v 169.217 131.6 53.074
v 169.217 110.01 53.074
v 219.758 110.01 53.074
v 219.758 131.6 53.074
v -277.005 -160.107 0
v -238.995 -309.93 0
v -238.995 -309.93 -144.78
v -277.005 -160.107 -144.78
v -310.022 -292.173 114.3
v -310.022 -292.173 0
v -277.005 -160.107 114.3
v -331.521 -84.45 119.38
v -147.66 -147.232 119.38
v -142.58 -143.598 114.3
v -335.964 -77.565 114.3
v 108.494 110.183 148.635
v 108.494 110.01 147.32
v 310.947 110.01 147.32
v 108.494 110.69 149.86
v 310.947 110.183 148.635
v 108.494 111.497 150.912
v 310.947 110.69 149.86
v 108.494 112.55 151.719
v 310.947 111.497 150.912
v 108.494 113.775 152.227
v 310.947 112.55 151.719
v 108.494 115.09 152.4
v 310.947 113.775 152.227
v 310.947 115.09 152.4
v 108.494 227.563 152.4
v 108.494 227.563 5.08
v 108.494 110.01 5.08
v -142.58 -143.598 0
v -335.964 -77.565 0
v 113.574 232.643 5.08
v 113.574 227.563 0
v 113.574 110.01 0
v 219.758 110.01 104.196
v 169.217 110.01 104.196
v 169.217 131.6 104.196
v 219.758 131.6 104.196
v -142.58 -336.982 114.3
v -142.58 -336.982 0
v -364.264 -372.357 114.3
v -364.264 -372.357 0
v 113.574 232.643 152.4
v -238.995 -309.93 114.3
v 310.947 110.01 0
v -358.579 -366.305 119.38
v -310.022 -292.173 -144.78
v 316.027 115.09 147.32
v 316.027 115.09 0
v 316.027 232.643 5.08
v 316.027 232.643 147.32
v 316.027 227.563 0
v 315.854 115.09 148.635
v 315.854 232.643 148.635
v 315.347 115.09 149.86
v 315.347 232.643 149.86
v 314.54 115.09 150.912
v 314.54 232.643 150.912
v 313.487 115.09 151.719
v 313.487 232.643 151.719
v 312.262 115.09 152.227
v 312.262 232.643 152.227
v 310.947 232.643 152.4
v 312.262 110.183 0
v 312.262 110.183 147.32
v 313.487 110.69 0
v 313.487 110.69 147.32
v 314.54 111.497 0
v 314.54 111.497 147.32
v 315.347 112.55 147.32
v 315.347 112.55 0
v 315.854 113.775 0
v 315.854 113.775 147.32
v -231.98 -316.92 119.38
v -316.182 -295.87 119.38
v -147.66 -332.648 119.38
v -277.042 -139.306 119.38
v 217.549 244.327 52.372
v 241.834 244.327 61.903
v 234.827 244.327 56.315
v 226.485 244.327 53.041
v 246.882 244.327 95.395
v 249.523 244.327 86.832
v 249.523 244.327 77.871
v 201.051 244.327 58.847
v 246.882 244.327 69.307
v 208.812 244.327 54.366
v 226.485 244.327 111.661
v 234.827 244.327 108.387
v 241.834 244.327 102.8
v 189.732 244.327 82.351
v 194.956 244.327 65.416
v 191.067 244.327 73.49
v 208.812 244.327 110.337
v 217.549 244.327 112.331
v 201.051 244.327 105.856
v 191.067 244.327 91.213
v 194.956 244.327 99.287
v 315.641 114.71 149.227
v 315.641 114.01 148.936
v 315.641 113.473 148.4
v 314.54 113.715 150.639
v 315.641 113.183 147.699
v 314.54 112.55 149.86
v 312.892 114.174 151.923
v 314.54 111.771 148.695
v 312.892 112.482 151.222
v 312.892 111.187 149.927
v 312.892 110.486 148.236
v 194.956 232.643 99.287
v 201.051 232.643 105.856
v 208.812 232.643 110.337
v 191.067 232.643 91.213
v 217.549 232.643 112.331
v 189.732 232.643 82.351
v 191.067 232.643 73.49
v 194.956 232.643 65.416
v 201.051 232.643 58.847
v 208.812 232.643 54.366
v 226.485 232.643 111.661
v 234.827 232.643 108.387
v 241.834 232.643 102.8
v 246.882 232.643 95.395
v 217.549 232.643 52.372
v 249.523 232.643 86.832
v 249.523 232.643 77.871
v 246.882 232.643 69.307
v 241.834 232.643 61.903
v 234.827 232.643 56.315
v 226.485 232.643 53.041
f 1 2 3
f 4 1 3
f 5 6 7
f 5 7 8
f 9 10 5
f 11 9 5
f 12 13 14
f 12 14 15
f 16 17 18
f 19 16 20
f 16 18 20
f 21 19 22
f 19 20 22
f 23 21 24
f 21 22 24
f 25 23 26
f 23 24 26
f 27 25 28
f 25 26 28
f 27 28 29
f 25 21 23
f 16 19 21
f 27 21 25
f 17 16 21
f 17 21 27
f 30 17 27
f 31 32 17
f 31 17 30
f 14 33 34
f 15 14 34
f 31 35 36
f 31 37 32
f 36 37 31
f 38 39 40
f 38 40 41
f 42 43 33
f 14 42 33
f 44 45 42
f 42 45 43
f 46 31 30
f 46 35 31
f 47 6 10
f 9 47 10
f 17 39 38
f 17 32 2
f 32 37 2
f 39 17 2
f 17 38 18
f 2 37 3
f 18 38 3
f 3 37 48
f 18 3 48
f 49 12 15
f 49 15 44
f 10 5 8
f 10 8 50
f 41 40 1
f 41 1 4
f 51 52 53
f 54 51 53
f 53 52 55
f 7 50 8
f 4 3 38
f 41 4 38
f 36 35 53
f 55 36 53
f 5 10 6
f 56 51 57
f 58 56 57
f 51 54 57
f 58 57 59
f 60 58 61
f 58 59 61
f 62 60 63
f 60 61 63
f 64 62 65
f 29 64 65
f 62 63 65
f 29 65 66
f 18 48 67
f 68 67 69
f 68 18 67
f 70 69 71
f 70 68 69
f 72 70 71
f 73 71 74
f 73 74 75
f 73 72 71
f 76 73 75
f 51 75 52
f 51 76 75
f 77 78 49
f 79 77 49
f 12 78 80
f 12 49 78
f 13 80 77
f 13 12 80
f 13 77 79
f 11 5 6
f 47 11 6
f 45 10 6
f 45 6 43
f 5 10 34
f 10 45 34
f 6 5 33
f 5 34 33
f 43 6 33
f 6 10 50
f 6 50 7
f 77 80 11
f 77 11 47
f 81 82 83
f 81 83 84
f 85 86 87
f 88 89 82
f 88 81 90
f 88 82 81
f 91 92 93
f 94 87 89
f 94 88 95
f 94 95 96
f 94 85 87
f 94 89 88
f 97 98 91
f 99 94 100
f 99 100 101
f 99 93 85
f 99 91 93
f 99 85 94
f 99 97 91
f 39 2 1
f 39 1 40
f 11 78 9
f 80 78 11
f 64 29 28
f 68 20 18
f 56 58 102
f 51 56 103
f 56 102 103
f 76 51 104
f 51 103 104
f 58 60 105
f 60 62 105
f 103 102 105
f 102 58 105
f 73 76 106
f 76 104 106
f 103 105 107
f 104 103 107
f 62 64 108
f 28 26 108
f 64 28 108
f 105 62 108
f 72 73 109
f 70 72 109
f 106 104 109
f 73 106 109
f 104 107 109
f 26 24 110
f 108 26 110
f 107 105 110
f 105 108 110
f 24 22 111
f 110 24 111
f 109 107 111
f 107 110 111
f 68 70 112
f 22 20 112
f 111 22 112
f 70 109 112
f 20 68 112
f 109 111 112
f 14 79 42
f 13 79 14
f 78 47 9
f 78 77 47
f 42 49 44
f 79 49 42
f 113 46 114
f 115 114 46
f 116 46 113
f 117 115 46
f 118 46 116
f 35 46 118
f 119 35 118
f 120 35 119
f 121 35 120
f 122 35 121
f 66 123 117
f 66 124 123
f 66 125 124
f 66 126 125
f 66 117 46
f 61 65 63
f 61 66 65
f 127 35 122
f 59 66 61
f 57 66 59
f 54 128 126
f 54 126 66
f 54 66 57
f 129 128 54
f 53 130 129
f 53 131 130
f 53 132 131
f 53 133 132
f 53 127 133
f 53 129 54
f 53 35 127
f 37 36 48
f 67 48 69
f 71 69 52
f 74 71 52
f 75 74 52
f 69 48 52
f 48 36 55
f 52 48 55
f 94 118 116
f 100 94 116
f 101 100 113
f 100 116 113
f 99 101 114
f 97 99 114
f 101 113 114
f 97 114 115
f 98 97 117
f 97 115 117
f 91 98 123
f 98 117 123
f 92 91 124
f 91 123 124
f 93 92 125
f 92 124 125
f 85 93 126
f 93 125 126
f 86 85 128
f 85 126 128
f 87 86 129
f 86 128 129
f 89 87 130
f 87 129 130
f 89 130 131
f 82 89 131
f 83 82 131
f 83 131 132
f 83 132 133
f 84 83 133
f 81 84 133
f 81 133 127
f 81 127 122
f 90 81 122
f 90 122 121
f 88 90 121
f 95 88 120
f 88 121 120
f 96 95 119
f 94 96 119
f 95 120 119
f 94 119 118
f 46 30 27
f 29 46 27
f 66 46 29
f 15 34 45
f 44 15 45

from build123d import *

# Parameters (mm, degrees)
F0_W      = 207.5331061672
F0_H      = 122.6332091976
F1_DEPTH  = 152.4
F3_DEPTH  = 144.78
F4_DEPTH  = 119.38
F5_R      = 5.08
F6_SIZE   = 5.08
F7_SIZE   = 5.08
F8_R      = 30.0636447878
F9_DEPTH  = 11.684
F10_W     = 50.5407005548
F10_H     = 51.1219091713
F11_DEPTH = 21.59


# Not quite as in the source:
# - the program builds the solid bodies; features that only make, move or delete a surface that nothing else refers to are left out


with BuildPart() as f1:
    # F0 (on Top) → F1 (new body)
    with BuildSketch(Plane.XY):
        with Locations((212.2609269613, 171.3262020208)):
            Rectangle(F0_W, F0_H)
    extrude(amount=F1_DEPTH)

    # F5
    f5_edges = [f1.edges().sort_by_distance(p)[0] for p in [
        (212.260927, 110.009597, 152.4),
        (316.02748, 171.326202, 152.4),
        (316.02748, 110.009597, 76.2),
    ]]
    fillet(f5_edges, radius=F5_R)

    # F6
    f6_edges = [f1.edges().sort_by_distance(p)[0] for p in [
        (108.494374, 232.642807, 76.2),
        (212.260927, 232.642807, 0),
        (108.494374, 171.326202, 0),
    ]]
    chamfer(f6_edges, length=F6_SIZE)

    # F8 (on face) → F9 (join)
    with BuildSketch(Plane(origin=(0, 232.6428066196, 0), x_dir=(-1, 0, 0), z_dir=(0, 1, 0))):
        with Locations((-219.7953462601, 82.3513418436)):
            Circle(F8_R)
    extrude(amount=F9_DEPTH)

    # F10 (on face) → F11 (cut)
    with BuildSketch(Plane.XZ.offset(-110.009597422)):
        with Locations((194.4875046611, 78.6354225129)):
            Rectangle(F10_W, F10_H)
    extrude(amount=-F11_DEPTH, mode=Mode.SUBTRACT)


with BuildPart() as f3:
    # F0 (on Top) → F3 (new body)
    with BuildSketch(Plane.XY):
        Polygon((-238.994547933, -309.9301279931), (-277.0052831988, -160.1067611335), (-310.0219274309, -292.1732745837), align=None)
    extrude(amount=-F3_DEPTH)


with BuildPart() as f4:
    # F0 (on Top) → F4 (new body)
    with BuildSketch(Plane.XY):
        Polygon((-142.5804198811, -143.5984707565), (-335.9635537997, -77.565192872), (-364.2635406156, -372.3565564559), (-142.5804198811, -336.9815940954), align=None)
        Polygon((-310.0219274309, -292.1732745837), (-277.0052831988, -160.1067611335), (-238.994547933, -309.9301279931), align=None, mode=Mode.SUBTRACT)
    extrude(amount=F4_DEPTH)

    # F7
    f7_edges = [f4.edges().sort_by_distance(p)[0] for p in [
        (-350.113547, -224.960875, 119.38),
        (-253.42198, -354.669075, 119.38),
        (-142.58042, -240.290032, 119.38),
        (-239.271987, -110.581832, 119.38),
        (-274.508238, -301.051701, 119.38),
        (-293.513605, -226.140018, 119.38),
        (-257.999916, -235.018445, 119.38),
    ]]
    chamfer(f7_edges, length=F7_SIZE)


solid = Compound([f1.part, f3.part, f4.part])
